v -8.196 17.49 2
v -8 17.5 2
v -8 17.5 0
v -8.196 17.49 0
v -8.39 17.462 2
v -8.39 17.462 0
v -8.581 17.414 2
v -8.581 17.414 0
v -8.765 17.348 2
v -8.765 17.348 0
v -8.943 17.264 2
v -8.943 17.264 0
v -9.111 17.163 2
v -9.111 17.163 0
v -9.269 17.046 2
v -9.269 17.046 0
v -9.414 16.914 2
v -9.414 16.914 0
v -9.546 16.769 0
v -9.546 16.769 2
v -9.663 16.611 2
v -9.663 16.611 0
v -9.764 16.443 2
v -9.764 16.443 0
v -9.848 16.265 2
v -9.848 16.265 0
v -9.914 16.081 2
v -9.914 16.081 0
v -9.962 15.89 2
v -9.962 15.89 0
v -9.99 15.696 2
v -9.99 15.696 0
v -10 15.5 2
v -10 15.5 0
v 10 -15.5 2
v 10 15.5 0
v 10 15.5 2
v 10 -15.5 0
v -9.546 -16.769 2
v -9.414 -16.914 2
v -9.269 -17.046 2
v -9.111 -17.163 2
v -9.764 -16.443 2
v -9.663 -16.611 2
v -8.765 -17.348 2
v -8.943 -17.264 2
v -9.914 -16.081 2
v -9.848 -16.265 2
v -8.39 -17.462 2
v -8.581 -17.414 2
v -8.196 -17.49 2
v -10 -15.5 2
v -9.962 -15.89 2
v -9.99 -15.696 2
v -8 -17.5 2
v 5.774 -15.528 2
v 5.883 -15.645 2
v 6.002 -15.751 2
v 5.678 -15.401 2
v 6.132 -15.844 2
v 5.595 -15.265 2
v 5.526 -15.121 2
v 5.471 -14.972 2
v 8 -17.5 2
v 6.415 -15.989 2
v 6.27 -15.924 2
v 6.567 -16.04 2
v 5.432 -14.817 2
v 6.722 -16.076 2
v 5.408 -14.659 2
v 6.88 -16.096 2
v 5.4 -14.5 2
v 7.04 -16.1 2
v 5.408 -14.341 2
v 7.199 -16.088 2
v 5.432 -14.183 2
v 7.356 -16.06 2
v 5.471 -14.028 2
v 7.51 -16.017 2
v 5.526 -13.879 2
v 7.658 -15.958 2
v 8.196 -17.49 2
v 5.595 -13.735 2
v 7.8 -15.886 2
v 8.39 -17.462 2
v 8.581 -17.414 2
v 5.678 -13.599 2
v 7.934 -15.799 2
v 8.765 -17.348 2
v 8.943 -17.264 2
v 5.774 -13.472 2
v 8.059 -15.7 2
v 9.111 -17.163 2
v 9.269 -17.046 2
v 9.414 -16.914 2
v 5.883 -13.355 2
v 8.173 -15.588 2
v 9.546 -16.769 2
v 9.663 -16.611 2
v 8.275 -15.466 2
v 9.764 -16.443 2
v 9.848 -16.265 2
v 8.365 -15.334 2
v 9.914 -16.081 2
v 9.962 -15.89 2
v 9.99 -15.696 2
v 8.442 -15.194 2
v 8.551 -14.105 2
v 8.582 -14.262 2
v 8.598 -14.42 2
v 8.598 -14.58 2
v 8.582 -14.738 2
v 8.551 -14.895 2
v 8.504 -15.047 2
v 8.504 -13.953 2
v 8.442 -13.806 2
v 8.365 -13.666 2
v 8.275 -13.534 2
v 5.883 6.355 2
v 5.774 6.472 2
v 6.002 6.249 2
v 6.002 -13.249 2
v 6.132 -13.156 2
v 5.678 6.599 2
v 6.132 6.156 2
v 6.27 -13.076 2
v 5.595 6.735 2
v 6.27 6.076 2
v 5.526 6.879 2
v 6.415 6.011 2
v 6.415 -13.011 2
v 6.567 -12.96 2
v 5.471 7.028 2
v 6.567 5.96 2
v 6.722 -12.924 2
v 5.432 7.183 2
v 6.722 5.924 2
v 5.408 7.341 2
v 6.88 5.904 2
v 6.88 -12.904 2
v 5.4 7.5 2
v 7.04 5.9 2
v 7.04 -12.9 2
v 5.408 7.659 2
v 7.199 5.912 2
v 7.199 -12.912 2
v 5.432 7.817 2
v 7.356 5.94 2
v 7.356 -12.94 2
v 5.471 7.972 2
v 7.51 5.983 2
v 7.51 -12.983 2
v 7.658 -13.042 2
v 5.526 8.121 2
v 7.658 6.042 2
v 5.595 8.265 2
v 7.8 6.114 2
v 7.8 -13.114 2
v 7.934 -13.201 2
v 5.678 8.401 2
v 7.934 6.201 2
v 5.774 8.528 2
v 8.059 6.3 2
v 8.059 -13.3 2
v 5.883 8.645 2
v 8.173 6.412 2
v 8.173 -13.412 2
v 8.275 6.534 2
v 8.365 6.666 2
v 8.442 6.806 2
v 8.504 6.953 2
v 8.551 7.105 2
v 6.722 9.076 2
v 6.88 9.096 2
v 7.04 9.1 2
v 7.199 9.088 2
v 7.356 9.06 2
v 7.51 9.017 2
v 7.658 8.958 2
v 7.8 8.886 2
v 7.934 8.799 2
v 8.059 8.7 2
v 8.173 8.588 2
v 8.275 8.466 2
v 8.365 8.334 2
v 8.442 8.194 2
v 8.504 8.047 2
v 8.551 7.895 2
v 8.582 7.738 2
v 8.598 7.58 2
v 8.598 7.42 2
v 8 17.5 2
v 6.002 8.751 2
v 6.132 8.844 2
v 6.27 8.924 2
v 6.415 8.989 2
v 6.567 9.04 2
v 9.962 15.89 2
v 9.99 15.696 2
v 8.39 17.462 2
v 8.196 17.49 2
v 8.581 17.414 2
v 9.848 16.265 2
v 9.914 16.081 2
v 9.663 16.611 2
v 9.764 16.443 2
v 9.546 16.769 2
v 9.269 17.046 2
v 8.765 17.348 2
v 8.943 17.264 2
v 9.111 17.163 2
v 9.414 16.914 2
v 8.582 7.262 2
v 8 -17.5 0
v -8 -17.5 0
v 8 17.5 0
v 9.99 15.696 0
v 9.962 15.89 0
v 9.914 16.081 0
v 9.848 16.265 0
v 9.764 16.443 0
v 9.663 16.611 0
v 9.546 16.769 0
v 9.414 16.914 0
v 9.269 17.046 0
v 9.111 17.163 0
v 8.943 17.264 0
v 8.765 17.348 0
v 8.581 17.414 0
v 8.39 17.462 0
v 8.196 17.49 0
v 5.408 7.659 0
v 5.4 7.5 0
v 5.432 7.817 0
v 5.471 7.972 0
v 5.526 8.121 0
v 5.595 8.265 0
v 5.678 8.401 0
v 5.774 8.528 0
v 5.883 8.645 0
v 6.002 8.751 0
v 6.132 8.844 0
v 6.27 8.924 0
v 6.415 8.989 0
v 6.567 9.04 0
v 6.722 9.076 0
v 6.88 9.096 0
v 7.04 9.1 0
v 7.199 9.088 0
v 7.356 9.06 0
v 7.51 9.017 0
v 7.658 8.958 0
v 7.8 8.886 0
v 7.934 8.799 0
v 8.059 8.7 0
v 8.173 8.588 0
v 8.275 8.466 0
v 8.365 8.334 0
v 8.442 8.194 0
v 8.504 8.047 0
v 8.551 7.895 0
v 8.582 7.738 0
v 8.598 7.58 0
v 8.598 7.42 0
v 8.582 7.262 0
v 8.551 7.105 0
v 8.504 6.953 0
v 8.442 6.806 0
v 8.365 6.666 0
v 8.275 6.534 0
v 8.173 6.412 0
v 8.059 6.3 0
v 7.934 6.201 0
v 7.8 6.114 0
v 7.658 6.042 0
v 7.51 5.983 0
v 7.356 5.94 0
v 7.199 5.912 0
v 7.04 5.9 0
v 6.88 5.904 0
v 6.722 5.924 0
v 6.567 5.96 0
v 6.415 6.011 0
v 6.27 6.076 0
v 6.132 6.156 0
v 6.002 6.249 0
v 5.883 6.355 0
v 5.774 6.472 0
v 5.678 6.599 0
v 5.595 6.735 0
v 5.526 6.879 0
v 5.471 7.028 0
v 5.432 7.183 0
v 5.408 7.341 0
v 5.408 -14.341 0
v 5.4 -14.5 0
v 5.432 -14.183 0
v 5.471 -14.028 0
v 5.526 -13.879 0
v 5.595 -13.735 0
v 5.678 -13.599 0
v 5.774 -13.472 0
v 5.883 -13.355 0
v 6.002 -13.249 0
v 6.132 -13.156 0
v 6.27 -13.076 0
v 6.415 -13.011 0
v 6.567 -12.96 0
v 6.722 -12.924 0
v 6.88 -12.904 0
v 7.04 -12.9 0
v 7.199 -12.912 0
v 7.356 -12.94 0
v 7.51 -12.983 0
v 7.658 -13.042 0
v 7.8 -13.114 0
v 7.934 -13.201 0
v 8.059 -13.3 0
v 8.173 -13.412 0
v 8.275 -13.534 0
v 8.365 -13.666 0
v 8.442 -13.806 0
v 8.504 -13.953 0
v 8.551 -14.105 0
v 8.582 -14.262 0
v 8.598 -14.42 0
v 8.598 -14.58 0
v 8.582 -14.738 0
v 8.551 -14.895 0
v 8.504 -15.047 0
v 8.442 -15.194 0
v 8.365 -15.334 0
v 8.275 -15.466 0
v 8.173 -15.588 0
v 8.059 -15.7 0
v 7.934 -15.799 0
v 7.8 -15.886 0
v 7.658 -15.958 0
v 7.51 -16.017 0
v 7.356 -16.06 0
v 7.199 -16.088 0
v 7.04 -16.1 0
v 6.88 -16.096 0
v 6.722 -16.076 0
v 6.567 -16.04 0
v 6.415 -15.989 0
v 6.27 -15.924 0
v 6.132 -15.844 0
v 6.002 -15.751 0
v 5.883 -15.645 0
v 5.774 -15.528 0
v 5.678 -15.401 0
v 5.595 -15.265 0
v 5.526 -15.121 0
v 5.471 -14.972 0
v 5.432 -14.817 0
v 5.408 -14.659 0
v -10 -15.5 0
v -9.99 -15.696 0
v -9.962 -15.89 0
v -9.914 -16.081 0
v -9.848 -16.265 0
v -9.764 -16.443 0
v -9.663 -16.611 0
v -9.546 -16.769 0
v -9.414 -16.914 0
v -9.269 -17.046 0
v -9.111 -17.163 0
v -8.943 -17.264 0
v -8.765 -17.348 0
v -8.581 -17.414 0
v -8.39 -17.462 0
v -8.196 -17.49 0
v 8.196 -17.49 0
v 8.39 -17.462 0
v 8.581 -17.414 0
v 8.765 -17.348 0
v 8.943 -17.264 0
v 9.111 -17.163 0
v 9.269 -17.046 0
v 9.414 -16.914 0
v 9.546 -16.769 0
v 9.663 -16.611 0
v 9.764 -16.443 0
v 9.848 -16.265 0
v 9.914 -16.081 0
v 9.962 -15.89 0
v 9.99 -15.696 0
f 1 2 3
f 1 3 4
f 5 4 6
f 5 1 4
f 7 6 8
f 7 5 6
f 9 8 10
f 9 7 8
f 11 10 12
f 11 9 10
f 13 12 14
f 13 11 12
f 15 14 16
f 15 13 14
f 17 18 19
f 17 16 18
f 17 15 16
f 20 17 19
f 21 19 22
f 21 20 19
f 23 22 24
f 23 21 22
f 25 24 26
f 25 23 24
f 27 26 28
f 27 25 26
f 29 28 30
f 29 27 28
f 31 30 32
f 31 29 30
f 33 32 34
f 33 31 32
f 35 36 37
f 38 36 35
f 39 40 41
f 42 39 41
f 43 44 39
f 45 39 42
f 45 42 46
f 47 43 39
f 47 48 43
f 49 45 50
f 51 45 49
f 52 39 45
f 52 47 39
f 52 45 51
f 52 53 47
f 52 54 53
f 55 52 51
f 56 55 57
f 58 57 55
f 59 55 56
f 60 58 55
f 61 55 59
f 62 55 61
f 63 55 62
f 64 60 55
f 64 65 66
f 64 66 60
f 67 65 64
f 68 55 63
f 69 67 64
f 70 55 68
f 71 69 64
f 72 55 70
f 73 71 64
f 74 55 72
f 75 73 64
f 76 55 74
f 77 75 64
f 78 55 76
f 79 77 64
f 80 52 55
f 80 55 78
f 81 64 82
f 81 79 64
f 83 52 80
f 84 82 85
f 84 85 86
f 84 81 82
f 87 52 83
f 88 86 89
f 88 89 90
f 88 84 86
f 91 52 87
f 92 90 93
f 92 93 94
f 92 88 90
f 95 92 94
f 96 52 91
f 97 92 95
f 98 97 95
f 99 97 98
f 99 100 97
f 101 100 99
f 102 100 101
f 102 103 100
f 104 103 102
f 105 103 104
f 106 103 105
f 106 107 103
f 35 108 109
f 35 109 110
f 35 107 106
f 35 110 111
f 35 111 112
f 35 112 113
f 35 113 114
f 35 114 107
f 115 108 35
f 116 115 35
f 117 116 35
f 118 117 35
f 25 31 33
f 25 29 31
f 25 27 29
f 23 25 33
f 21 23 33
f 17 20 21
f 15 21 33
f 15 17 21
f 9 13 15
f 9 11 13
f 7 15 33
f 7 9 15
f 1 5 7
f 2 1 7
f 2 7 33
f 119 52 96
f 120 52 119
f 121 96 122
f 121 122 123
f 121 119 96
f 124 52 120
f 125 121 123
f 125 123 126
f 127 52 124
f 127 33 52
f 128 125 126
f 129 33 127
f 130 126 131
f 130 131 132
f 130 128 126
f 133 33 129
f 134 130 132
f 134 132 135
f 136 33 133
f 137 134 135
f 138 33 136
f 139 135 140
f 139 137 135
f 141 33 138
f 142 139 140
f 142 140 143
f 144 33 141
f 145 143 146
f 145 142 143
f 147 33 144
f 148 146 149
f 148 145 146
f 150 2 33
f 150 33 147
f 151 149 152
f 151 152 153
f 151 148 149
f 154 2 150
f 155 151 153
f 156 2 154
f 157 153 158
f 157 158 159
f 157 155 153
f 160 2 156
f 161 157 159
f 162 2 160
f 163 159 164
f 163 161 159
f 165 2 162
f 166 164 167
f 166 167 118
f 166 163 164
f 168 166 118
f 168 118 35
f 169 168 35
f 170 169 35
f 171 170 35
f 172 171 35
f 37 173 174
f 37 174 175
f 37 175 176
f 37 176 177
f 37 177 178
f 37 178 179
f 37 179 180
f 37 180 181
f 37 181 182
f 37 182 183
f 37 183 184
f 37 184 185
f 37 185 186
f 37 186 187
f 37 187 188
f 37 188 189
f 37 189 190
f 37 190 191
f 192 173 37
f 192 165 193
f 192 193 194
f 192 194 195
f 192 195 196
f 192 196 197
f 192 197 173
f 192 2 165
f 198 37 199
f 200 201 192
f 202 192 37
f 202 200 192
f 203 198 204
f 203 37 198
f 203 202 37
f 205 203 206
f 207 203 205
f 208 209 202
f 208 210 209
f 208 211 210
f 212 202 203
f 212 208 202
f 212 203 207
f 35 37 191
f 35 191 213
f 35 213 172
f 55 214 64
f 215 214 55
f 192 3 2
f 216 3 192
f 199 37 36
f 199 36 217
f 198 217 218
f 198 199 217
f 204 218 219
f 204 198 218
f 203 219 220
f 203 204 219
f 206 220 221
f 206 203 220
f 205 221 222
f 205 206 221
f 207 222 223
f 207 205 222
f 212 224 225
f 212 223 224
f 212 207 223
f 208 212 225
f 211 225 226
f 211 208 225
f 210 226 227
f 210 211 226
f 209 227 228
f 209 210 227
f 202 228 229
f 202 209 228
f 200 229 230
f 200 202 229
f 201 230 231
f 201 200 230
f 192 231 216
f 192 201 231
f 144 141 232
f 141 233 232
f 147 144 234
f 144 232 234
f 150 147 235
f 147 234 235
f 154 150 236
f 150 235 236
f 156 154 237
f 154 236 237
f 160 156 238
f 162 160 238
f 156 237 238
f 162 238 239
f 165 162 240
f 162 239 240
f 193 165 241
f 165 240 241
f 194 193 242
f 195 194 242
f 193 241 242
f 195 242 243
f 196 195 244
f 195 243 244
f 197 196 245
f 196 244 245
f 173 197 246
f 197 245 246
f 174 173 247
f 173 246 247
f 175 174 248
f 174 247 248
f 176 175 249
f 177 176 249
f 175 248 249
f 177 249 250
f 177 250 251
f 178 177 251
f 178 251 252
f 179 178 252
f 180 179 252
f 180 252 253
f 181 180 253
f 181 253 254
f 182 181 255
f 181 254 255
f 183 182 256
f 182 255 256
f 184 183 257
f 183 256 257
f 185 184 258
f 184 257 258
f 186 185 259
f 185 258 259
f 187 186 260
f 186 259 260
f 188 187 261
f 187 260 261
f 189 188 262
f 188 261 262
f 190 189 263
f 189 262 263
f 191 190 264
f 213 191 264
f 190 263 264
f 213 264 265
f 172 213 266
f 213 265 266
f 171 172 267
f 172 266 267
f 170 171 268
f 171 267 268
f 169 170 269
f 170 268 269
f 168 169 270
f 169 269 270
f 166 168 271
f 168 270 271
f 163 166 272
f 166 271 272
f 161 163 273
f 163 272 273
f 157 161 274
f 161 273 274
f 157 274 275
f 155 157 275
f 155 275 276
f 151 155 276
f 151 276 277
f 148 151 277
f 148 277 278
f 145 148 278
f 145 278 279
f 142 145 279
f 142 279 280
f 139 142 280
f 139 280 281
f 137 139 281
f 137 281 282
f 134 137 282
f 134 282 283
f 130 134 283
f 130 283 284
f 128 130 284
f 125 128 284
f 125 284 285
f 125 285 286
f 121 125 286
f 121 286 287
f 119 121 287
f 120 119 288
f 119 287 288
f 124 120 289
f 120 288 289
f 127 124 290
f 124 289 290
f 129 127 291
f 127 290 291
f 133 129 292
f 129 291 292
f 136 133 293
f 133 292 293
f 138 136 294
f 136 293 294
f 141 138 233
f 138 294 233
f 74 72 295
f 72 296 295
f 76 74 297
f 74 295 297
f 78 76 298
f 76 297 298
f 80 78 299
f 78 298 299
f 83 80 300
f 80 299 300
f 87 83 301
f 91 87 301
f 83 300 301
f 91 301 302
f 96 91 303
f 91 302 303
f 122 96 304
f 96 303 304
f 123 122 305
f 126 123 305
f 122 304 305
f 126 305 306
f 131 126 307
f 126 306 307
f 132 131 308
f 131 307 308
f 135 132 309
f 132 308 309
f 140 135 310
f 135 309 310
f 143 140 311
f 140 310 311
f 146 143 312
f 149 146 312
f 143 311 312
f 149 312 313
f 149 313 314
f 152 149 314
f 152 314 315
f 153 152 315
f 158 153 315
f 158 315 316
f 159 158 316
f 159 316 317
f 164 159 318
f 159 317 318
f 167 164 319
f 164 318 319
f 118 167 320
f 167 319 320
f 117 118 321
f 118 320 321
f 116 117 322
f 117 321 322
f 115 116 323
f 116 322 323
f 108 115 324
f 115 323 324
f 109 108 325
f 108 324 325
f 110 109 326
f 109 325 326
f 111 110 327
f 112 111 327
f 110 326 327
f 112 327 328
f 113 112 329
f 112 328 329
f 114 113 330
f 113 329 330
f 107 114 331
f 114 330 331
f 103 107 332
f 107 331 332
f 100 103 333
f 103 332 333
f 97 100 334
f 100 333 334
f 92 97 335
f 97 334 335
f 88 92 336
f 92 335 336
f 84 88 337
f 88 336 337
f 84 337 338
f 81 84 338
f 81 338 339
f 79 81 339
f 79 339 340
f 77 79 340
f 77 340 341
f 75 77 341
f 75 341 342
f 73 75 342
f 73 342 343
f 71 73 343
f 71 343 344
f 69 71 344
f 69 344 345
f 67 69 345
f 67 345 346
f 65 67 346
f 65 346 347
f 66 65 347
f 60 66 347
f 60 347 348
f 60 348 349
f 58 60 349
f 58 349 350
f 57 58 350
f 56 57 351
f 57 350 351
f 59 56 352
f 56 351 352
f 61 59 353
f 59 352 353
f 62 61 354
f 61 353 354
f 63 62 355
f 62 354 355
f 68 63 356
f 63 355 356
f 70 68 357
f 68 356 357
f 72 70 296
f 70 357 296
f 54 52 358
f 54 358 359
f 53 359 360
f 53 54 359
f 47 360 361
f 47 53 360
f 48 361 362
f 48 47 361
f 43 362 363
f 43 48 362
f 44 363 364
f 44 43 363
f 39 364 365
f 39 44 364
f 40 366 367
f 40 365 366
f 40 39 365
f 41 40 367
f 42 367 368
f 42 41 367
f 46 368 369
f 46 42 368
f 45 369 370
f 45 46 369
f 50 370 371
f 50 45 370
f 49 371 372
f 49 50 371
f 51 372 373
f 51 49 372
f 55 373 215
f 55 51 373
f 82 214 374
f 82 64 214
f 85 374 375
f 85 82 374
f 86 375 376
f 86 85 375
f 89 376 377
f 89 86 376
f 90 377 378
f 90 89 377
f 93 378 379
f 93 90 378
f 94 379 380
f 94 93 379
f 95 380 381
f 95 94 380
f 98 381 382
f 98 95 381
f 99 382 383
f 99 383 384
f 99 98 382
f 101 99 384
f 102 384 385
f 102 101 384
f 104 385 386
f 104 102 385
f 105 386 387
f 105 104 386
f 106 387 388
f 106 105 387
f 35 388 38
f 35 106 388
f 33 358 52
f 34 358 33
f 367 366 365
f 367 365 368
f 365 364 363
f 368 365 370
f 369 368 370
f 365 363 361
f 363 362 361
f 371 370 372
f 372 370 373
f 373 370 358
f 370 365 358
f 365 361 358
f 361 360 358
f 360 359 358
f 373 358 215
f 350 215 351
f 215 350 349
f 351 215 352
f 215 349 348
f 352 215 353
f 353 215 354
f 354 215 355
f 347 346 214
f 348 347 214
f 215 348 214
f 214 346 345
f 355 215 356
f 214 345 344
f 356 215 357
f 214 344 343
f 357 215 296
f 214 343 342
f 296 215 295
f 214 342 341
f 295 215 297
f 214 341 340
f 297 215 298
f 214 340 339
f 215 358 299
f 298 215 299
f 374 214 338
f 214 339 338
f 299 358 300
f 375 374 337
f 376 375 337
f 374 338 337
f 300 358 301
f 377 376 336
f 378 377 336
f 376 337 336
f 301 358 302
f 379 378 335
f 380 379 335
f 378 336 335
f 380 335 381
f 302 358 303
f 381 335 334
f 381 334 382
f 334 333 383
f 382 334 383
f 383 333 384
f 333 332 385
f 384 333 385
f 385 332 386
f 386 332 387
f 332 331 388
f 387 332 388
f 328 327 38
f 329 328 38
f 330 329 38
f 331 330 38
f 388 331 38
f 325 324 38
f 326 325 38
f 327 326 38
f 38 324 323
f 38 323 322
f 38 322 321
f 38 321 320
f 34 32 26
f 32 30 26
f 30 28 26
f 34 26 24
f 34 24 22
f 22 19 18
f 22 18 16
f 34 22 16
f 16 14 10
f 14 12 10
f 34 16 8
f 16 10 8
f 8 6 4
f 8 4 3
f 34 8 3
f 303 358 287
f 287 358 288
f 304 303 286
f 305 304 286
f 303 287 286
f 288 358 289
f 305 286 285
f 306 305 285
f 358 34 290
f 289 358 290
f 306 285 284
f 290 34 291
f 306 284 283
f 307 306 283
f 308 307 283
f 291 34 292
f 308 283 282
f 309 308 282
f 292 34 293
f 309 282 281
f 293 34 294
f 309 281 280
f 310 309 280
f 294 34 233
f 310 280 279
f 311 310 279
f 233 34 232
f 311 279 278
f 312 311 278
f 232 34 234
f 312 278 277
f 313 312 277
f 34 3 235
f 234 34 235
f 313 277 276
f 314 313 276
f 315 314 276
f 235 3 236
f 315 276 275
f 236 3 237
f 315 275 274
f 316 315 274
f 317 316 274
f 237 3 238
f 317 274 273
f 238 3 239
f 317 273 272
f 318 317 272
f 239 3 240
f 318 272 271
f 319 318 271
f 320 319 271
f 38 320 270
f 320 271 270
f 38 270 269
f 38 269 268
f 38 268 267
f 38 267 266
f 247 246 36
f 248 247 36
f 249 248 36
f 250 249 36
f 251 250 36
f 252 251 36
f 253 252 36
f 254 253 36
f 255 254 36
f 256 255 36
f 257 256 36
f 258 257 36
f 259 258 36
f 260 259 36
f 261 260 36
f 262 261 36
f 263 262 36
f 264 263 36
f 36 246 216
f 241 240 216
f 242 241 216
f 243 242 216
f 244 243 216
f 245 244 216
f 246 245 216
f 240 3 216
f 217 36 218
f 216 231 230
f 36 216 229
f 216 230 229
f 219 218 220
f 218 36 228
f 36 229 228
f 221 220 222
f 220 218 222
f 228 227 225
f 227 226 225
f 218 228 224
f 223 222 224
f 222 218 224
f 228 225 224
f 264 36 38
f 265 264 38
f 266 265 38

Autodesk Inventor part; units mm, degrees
ref_plane "YZ Plane" through (0, 0, 0) normal (1, 0, 0) x (0, 1, 0)
ref_plane "XZ Plane" through (0, 0, 0) normal (0, 1, 0) x (-1, 0, 0)
ref_plane "XY Plane" through (0, 0, 0) normal (0, 0, 1) x (1, 0, 0)
sketch "Эскиз1" plane through (0, 0, 0) normal (0, 0, 1) x (1, 0, 0)
  line L0 (10, -17.5) -> (-10, -17.5)
  line L1 (-10, -17.5) -> (-10, 17.5)
  line L2 (-10, 17.5) -> (10, 17.5)
  line L3 (10, 17.5) -> (10, -17.5)
  line L4 (10, -17.5) -> (-10, 17.5) construction
  line L5 (-10, -17.5) -> (10, 17.5) construction
  point P0 (0, 0)
  dimension "d0" = 20
  dimension "d1" = 35
extrude "Выдавливание1" add sketch "Эскиз1" along normal blind 2
fillet "Сопряжение1" radius 2 4 edges at (-10, 17.5, 1) (10, 17.5, 1) (10, -17.5, 1) (-10, -17.5, 1)
sketch "Эскиз2" plane through (0, 0, 0) normal (0, 0, -1) x (-1, 0, 0)
  circle A0 centre (-7, 7.5) radius 2.1 projected
  circle A1 centre (-7, -14.5) radius 2.1 projected
  line L0 (-5.7982, 10.5) -> (-5.7982, 18.5) projected
  line L1 (-5.7982, 18.5) -> (-8, 18.5) projected
  arc A2 (-8, 18.5) -> (-11, 15.5) centre (-8, 15.5) ccw projected
  line L2 (-11, 15.5) -> (-11, 2.5) projected
  arc A3 (-11, -15.5) -> (-8, -18.5) centre (-8, -15.5) ccw projected
  line L3 (-8, -18.5) -> (8, -18.5) projected
  arc A4 (8, -18.5) -> (11, -15.5) centre (8, -15.5) ccw projected
  line L4 (11, 6) -> (11, 10.5) projected
  line L5 (11, 10.5) -> (-5.7982, 10.5) projected
  circle A5 centre (-7, -14.5) radius 1.6
  circle A6 centre (-7, 7.5) radius 1.6
  line L6 (-11, 2.5) -> (-4, 2.5) projected
  line L7 (-4, 2.5) -> (-4, -9.5) projected
  line L8 (-4, -9.5) -> (-11, -9.5) projected
  line L9 (11, -6) -> (4, -6) projected
  line L10 (4, -6) -> (4, 6) projected
  line L11 (4, 6) -> (11, 6) projected
  line L12 (-11, -9.5) -> (-11, -15.5) projected
  line L13 (11, -15.5) -> (11, -6) projected
  point P0 (0, 0)
  dimension "d5" = 3.2
  dimension "d6" = 3.2
extrude "Выдавливание2" cut sketch "Эскиз2" against normal blind 2 contours A5 | A6
properties part number "comutation_motorboard"
